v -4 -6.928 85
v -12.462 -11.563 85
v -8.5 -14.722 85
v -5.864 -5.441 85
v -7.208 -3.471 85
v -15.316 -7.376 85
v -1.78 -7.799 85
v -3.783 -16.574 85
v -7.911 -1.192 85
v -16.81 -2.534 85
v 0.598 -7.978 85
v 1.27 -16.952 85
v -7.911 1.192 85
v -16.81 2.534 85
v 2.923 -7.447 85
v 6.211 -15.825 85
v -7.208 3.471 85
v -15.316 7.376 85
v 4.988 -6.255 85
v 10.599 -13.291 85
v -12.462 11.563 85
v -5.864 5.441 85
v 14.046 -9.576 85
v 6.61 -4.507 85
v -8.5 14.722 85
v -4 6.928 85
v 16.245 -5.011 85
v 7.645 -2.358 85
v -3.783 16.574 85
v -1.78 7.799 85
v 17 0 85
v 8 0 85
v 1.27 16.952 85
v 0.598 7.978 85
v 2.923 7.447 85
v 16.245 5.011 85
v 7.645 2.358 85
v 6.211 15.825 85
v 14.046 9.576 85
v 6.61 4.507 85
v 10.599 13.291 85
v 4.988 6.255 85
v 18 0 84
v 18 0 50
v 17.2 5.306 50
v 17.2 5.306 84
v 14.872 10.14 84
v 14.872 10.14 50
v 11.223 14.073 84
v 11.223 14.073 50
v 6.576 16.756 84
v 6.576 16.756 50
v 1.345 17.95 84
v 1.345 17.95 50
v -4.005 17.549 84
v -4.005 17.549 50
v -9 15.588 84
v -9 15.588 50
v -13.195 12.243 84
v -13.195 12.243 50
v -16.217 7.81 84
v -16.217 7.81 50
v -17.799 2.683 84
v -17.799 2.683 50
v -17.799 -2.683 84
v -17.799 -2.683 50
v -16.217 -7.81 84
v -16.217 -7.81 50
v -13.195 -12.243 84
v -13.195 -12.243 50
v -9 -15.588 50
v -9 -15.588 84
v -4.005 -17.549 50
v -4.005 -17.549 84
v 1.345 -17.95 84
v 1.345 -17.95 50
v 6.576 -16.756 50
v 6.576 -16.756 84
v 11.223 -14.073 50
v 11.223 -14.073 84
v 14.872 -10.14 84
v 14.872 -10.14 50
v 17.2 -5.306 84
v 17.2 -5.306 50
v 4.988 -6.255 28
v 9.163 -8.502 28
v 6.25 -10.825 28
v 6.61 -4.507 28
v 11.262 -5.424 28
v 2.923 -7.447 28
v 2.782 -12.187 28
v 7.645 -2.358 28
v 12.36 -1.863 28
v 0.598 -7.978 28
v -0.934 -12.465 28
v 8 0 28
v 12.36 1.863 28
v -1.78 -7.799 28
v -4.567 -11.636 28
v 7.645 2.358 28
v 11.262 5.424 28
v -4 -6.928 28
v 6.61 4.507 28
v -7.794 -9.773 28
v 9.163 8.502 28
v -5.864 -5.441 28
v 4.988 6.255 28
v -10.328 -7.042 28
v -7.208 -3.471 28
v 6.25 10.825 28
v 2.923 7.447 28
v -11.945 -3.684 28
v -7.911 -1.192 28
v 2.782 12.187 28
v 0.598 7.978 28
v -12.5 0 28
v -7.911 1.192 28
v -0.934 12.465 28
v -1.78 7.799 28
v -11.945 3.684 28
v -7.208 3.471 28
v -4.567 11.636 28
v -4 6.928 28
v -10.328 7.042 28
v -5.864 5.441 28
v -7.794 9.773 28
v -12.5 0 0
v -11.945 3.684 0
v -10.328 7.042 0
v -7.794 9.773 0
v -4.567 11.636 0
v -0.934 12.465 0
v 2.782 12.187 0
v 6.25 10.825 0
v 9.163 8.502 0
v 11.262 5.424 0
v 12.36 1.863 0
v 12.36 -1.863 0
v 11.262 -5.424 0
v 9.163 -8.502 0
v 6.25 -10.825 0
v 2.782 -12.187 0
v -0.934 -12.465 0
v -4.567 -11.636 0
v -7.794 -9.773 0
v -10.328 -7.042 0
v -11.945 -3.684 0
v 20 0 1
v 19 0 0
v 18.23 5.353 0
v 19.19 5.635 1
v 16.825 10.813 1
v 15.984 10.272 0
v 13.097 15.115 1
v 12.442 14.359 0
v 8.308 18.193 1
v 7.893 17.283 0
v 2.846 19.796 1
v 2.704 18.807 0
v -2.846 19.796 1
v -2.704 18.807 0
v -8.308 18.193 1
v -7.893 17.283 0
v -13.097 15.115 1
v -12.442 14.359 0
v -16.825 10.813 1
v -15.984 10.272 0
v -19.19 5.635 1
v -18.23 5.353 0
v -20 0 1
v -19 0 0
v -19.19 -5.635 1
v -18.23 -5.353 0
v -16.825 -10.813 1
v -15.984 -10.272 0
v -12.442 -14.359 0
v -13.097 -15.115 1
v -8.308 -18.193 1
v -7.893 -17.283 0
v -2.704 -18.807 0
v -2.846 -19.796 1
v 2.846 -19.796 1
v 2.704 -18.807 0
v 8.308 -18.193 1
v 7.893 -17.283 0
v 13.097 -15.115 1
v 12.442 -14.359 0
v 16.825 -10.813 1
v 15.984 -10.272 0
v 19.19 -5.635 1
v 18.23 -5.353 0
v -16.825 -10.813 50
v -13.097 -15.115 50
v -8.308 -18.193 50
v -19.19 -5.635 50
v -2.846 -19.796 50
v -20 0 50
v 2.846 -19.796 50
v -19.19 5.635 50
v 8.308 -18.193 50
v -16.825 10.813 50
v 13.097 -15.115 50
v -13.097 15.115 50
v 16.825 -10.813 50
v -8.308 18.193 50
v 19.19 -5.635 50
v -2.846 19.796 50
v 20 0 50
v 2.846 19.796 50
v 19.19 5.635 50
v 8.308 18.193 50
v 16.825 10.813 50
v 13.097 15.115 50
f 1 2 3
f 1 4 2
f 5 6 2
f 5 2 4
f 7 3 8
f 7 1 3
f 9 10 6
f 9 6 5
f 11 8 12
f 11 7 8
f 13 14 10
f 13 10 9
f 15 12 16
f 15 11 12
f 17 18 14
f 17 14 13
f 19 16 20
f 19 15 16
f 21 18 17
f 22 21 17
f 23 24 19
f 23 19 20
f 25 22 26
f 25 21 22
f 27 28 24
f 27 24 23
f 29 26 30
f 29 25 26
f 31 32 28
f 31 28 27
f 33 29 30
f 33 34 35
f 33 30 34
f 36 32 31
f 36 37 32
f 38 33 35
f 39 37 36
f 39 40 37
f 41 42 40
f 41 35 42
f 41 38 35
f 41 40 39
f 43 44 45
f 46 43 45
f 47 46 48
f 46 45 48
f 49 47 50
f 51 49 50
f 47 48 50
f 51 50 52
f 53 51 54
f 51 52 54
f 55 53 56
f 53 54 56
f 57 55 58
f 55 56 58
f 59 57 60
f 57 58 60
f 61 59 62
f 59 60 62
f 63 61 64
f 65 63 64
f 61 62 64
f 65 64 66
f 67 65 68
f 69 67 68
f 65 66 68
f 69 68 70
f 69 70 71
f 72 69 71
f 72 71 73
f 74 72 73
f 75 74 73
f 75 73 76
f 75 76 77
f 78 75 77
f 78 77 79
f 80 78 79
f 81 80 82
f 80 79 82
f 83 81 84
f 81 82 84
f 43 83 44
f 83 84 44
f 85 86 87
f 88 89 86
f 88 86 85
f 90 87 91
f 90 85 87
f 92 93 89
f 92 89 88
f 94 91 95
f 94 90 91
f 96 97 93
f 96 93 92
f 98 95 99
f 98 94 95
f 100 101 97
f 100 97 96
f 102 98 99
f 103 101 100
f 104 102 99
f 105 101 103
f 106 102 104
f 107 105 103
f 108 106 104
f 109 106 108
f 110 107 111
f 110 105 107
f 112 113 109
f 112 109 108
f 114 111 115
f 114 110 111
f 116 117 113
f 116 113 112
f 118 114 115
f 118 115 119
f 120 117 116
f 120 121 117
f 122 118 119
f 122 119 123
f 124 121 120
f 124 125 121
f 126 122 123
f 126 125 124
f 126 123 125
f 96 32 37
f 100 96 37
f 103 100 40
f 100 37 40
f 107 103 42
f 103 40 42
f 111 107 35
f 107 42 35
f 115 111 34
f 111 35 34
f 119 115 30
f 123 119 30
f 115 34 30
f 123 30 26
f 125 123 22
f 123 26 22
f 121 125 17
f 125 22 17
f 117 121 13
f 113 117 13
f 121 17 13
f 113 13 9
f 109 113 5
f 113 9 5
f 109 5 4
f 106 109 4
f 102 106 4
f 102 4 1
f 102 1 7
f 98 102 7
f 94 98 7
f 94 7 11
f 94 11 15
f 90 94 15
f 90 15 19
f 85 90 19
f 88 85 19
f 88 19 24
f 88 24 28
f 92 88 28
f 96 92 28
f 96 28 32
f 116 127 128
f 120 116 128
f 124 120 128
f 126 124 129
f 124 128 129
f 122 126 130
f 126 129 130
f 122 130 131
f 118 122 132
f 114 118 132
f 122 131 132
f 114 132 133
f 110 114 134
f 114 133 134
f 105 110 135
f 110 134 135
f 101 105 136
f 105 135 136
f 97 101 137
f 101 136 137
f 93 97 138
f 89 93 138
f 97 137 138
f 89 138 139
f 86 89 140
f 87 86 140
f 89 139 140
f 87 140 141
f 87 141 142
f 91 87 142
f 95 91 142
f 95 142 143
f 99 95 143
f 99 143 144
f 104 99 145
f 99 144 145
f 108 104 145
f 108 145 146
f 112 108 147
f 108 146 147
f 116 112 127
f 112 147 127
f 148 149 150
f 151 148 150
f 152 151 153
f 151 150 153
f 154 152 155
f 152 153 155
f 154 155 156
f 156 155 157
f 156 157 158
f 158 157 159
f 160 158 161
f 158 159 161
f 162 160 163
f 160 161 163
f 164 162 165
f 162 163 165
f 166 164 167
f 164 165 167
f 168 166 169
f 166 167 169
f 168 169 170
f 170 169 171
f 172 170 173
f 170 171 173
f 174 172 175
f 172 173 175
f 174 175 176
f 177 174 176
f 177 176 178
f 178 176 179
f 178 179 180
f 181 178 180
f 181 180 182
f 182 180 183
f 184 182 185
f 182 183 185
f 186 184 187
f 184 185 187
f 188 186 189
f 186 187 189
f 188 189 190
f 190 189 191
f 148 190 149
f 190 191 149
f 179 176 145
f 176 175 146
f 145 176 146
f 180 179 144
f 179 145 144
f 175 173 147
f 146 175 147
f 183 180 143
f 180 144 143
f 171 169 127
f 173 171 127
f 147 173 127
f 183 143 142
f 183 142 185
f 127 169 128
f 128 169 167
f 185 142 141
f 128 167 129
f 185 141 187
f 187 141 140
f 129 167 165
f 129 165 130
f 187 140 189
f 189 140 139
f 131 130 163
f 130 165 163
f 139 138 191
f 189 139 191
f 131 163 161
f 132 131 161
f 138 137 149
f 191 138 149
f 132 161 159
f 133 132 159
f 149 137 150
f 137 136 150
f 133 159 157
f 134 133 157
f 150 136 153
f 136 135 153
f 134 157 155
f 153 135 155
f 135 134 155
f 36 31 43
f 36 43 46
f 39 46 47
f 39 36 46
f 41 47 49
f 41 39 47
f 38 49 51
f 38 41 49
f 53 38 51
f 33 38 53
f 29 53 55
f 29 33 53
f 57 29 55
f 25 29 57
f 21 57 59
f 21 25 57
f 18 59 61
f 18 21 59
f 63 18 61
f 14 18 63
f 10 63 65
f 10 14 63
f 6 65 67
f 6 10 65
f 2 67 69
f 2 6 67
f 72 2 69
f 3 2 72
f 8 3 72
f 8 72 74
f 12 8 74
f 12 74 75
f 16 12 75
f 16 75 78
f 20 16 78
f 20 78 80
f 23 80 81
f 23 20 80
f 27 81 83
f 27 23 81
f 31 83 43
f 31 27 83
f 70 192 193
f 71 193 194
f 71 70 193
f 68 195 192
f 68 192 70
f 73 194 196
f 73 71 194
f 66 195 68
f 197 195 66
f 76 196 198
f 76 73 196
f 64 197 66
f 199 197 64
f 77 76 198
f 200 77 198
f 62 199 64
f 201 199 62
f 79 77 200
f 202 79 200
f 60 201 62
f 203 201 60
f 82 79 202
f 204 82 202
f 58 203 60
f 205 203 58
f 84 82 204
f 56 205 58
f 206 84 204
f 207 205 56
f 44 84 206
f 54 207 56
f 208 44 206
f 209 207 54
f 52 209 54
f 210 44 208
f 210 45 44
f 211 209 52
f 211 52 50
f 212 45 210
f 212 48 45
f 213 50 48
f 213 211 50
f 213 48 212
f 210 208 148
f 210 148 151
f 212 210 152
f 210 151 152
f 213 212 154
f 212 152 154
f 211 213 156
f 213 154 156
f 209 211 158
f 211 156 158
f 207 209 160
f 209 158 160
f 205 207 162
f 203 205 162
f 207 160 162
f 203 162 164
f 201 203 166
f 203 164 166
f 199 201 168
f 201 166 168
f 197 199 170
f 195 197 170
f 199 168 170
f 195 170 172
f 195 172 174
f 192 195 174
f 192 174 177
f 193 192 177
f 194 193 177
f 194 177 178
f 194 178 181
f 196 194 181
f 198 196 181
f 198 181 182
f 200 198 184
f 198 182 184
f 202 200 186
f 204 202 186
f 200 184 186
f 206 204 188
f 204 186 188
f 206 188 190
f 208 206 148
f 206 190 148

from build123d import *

# Parameters (mm, degrees)
CROQUIS1_R              = 20
SALIENTE_EXTRUIR1_DEPTH = 50
CROQUIS2_R              = 18
SALIENTE_EXTRUIR2_DEPTH = 35
CROQUIS3_R              = 12.5
CORTAR_EXTRUIR1_DEPTH   = 28
CORTAR_EXTRUIR2_REACH   = 91.582
CROQUIS4_R              = 8
CHAFL_N1_SIZE           = 1


with BuildPart() as part:
    # Croquis1 → Saliente-Extruir1 (new body)
    with BuildSketch(Plane.XY):
        Circle(CROQUIS1_R)
    extrude(amount=SALIENTE_EXTRUIR1_DEPTH)

    # Croquis2 → Saliente-Extruir2 (add)
    with BuildSketch(Plane.XY.offset(50)):
        Circle(CROQUIS2_R)
    extrude(amount=SALIENTE_EXTRUIR2_DEPTH)

    # Croquis3 → Cortar-Extruir1 (cut)
    with BuildSketch(Plane(origin=(0, 0, 0), x_dir=(-1, 0, 0), z_dir=(0, 0, -1))):
        Circle(CROQUIS3_R)
    extrude(amount=-CORTAR_EXTRUIR1_DEPTH, mode=Mode.SUBTRACT)

    # Croquis4 → Cortar-Extruir2 (cut, up to next)
    with BuildSketch(Plane.XY.offset(85), mode=Mode.PRIVATE) as cortar_extruir2_sk1:
        Circle(CROQUIS4_R)
    cortar_extruir2_tool1 = extrude(cortar_extruir2_sk1.sketch, amount=-CORTAR_EXTRUIR2_REACH, mode=Mode.PRIVATE) & part.part
    add(cortar_extruir2_tool1.solids().sort_by_distance((0, 0, 85))[0], mode=Mode.SUBTRACT)

    # Chaflán1
    chafl_n1_edges = [part.edges().sort_by_distance(p)[0] for p in [
        (-20, 0, 0),
        (-18, 0, 85),
    ]]
    chamfer(chafl_n1_edges, length=CHAFL_N1_SIZE)


solid = part.part
